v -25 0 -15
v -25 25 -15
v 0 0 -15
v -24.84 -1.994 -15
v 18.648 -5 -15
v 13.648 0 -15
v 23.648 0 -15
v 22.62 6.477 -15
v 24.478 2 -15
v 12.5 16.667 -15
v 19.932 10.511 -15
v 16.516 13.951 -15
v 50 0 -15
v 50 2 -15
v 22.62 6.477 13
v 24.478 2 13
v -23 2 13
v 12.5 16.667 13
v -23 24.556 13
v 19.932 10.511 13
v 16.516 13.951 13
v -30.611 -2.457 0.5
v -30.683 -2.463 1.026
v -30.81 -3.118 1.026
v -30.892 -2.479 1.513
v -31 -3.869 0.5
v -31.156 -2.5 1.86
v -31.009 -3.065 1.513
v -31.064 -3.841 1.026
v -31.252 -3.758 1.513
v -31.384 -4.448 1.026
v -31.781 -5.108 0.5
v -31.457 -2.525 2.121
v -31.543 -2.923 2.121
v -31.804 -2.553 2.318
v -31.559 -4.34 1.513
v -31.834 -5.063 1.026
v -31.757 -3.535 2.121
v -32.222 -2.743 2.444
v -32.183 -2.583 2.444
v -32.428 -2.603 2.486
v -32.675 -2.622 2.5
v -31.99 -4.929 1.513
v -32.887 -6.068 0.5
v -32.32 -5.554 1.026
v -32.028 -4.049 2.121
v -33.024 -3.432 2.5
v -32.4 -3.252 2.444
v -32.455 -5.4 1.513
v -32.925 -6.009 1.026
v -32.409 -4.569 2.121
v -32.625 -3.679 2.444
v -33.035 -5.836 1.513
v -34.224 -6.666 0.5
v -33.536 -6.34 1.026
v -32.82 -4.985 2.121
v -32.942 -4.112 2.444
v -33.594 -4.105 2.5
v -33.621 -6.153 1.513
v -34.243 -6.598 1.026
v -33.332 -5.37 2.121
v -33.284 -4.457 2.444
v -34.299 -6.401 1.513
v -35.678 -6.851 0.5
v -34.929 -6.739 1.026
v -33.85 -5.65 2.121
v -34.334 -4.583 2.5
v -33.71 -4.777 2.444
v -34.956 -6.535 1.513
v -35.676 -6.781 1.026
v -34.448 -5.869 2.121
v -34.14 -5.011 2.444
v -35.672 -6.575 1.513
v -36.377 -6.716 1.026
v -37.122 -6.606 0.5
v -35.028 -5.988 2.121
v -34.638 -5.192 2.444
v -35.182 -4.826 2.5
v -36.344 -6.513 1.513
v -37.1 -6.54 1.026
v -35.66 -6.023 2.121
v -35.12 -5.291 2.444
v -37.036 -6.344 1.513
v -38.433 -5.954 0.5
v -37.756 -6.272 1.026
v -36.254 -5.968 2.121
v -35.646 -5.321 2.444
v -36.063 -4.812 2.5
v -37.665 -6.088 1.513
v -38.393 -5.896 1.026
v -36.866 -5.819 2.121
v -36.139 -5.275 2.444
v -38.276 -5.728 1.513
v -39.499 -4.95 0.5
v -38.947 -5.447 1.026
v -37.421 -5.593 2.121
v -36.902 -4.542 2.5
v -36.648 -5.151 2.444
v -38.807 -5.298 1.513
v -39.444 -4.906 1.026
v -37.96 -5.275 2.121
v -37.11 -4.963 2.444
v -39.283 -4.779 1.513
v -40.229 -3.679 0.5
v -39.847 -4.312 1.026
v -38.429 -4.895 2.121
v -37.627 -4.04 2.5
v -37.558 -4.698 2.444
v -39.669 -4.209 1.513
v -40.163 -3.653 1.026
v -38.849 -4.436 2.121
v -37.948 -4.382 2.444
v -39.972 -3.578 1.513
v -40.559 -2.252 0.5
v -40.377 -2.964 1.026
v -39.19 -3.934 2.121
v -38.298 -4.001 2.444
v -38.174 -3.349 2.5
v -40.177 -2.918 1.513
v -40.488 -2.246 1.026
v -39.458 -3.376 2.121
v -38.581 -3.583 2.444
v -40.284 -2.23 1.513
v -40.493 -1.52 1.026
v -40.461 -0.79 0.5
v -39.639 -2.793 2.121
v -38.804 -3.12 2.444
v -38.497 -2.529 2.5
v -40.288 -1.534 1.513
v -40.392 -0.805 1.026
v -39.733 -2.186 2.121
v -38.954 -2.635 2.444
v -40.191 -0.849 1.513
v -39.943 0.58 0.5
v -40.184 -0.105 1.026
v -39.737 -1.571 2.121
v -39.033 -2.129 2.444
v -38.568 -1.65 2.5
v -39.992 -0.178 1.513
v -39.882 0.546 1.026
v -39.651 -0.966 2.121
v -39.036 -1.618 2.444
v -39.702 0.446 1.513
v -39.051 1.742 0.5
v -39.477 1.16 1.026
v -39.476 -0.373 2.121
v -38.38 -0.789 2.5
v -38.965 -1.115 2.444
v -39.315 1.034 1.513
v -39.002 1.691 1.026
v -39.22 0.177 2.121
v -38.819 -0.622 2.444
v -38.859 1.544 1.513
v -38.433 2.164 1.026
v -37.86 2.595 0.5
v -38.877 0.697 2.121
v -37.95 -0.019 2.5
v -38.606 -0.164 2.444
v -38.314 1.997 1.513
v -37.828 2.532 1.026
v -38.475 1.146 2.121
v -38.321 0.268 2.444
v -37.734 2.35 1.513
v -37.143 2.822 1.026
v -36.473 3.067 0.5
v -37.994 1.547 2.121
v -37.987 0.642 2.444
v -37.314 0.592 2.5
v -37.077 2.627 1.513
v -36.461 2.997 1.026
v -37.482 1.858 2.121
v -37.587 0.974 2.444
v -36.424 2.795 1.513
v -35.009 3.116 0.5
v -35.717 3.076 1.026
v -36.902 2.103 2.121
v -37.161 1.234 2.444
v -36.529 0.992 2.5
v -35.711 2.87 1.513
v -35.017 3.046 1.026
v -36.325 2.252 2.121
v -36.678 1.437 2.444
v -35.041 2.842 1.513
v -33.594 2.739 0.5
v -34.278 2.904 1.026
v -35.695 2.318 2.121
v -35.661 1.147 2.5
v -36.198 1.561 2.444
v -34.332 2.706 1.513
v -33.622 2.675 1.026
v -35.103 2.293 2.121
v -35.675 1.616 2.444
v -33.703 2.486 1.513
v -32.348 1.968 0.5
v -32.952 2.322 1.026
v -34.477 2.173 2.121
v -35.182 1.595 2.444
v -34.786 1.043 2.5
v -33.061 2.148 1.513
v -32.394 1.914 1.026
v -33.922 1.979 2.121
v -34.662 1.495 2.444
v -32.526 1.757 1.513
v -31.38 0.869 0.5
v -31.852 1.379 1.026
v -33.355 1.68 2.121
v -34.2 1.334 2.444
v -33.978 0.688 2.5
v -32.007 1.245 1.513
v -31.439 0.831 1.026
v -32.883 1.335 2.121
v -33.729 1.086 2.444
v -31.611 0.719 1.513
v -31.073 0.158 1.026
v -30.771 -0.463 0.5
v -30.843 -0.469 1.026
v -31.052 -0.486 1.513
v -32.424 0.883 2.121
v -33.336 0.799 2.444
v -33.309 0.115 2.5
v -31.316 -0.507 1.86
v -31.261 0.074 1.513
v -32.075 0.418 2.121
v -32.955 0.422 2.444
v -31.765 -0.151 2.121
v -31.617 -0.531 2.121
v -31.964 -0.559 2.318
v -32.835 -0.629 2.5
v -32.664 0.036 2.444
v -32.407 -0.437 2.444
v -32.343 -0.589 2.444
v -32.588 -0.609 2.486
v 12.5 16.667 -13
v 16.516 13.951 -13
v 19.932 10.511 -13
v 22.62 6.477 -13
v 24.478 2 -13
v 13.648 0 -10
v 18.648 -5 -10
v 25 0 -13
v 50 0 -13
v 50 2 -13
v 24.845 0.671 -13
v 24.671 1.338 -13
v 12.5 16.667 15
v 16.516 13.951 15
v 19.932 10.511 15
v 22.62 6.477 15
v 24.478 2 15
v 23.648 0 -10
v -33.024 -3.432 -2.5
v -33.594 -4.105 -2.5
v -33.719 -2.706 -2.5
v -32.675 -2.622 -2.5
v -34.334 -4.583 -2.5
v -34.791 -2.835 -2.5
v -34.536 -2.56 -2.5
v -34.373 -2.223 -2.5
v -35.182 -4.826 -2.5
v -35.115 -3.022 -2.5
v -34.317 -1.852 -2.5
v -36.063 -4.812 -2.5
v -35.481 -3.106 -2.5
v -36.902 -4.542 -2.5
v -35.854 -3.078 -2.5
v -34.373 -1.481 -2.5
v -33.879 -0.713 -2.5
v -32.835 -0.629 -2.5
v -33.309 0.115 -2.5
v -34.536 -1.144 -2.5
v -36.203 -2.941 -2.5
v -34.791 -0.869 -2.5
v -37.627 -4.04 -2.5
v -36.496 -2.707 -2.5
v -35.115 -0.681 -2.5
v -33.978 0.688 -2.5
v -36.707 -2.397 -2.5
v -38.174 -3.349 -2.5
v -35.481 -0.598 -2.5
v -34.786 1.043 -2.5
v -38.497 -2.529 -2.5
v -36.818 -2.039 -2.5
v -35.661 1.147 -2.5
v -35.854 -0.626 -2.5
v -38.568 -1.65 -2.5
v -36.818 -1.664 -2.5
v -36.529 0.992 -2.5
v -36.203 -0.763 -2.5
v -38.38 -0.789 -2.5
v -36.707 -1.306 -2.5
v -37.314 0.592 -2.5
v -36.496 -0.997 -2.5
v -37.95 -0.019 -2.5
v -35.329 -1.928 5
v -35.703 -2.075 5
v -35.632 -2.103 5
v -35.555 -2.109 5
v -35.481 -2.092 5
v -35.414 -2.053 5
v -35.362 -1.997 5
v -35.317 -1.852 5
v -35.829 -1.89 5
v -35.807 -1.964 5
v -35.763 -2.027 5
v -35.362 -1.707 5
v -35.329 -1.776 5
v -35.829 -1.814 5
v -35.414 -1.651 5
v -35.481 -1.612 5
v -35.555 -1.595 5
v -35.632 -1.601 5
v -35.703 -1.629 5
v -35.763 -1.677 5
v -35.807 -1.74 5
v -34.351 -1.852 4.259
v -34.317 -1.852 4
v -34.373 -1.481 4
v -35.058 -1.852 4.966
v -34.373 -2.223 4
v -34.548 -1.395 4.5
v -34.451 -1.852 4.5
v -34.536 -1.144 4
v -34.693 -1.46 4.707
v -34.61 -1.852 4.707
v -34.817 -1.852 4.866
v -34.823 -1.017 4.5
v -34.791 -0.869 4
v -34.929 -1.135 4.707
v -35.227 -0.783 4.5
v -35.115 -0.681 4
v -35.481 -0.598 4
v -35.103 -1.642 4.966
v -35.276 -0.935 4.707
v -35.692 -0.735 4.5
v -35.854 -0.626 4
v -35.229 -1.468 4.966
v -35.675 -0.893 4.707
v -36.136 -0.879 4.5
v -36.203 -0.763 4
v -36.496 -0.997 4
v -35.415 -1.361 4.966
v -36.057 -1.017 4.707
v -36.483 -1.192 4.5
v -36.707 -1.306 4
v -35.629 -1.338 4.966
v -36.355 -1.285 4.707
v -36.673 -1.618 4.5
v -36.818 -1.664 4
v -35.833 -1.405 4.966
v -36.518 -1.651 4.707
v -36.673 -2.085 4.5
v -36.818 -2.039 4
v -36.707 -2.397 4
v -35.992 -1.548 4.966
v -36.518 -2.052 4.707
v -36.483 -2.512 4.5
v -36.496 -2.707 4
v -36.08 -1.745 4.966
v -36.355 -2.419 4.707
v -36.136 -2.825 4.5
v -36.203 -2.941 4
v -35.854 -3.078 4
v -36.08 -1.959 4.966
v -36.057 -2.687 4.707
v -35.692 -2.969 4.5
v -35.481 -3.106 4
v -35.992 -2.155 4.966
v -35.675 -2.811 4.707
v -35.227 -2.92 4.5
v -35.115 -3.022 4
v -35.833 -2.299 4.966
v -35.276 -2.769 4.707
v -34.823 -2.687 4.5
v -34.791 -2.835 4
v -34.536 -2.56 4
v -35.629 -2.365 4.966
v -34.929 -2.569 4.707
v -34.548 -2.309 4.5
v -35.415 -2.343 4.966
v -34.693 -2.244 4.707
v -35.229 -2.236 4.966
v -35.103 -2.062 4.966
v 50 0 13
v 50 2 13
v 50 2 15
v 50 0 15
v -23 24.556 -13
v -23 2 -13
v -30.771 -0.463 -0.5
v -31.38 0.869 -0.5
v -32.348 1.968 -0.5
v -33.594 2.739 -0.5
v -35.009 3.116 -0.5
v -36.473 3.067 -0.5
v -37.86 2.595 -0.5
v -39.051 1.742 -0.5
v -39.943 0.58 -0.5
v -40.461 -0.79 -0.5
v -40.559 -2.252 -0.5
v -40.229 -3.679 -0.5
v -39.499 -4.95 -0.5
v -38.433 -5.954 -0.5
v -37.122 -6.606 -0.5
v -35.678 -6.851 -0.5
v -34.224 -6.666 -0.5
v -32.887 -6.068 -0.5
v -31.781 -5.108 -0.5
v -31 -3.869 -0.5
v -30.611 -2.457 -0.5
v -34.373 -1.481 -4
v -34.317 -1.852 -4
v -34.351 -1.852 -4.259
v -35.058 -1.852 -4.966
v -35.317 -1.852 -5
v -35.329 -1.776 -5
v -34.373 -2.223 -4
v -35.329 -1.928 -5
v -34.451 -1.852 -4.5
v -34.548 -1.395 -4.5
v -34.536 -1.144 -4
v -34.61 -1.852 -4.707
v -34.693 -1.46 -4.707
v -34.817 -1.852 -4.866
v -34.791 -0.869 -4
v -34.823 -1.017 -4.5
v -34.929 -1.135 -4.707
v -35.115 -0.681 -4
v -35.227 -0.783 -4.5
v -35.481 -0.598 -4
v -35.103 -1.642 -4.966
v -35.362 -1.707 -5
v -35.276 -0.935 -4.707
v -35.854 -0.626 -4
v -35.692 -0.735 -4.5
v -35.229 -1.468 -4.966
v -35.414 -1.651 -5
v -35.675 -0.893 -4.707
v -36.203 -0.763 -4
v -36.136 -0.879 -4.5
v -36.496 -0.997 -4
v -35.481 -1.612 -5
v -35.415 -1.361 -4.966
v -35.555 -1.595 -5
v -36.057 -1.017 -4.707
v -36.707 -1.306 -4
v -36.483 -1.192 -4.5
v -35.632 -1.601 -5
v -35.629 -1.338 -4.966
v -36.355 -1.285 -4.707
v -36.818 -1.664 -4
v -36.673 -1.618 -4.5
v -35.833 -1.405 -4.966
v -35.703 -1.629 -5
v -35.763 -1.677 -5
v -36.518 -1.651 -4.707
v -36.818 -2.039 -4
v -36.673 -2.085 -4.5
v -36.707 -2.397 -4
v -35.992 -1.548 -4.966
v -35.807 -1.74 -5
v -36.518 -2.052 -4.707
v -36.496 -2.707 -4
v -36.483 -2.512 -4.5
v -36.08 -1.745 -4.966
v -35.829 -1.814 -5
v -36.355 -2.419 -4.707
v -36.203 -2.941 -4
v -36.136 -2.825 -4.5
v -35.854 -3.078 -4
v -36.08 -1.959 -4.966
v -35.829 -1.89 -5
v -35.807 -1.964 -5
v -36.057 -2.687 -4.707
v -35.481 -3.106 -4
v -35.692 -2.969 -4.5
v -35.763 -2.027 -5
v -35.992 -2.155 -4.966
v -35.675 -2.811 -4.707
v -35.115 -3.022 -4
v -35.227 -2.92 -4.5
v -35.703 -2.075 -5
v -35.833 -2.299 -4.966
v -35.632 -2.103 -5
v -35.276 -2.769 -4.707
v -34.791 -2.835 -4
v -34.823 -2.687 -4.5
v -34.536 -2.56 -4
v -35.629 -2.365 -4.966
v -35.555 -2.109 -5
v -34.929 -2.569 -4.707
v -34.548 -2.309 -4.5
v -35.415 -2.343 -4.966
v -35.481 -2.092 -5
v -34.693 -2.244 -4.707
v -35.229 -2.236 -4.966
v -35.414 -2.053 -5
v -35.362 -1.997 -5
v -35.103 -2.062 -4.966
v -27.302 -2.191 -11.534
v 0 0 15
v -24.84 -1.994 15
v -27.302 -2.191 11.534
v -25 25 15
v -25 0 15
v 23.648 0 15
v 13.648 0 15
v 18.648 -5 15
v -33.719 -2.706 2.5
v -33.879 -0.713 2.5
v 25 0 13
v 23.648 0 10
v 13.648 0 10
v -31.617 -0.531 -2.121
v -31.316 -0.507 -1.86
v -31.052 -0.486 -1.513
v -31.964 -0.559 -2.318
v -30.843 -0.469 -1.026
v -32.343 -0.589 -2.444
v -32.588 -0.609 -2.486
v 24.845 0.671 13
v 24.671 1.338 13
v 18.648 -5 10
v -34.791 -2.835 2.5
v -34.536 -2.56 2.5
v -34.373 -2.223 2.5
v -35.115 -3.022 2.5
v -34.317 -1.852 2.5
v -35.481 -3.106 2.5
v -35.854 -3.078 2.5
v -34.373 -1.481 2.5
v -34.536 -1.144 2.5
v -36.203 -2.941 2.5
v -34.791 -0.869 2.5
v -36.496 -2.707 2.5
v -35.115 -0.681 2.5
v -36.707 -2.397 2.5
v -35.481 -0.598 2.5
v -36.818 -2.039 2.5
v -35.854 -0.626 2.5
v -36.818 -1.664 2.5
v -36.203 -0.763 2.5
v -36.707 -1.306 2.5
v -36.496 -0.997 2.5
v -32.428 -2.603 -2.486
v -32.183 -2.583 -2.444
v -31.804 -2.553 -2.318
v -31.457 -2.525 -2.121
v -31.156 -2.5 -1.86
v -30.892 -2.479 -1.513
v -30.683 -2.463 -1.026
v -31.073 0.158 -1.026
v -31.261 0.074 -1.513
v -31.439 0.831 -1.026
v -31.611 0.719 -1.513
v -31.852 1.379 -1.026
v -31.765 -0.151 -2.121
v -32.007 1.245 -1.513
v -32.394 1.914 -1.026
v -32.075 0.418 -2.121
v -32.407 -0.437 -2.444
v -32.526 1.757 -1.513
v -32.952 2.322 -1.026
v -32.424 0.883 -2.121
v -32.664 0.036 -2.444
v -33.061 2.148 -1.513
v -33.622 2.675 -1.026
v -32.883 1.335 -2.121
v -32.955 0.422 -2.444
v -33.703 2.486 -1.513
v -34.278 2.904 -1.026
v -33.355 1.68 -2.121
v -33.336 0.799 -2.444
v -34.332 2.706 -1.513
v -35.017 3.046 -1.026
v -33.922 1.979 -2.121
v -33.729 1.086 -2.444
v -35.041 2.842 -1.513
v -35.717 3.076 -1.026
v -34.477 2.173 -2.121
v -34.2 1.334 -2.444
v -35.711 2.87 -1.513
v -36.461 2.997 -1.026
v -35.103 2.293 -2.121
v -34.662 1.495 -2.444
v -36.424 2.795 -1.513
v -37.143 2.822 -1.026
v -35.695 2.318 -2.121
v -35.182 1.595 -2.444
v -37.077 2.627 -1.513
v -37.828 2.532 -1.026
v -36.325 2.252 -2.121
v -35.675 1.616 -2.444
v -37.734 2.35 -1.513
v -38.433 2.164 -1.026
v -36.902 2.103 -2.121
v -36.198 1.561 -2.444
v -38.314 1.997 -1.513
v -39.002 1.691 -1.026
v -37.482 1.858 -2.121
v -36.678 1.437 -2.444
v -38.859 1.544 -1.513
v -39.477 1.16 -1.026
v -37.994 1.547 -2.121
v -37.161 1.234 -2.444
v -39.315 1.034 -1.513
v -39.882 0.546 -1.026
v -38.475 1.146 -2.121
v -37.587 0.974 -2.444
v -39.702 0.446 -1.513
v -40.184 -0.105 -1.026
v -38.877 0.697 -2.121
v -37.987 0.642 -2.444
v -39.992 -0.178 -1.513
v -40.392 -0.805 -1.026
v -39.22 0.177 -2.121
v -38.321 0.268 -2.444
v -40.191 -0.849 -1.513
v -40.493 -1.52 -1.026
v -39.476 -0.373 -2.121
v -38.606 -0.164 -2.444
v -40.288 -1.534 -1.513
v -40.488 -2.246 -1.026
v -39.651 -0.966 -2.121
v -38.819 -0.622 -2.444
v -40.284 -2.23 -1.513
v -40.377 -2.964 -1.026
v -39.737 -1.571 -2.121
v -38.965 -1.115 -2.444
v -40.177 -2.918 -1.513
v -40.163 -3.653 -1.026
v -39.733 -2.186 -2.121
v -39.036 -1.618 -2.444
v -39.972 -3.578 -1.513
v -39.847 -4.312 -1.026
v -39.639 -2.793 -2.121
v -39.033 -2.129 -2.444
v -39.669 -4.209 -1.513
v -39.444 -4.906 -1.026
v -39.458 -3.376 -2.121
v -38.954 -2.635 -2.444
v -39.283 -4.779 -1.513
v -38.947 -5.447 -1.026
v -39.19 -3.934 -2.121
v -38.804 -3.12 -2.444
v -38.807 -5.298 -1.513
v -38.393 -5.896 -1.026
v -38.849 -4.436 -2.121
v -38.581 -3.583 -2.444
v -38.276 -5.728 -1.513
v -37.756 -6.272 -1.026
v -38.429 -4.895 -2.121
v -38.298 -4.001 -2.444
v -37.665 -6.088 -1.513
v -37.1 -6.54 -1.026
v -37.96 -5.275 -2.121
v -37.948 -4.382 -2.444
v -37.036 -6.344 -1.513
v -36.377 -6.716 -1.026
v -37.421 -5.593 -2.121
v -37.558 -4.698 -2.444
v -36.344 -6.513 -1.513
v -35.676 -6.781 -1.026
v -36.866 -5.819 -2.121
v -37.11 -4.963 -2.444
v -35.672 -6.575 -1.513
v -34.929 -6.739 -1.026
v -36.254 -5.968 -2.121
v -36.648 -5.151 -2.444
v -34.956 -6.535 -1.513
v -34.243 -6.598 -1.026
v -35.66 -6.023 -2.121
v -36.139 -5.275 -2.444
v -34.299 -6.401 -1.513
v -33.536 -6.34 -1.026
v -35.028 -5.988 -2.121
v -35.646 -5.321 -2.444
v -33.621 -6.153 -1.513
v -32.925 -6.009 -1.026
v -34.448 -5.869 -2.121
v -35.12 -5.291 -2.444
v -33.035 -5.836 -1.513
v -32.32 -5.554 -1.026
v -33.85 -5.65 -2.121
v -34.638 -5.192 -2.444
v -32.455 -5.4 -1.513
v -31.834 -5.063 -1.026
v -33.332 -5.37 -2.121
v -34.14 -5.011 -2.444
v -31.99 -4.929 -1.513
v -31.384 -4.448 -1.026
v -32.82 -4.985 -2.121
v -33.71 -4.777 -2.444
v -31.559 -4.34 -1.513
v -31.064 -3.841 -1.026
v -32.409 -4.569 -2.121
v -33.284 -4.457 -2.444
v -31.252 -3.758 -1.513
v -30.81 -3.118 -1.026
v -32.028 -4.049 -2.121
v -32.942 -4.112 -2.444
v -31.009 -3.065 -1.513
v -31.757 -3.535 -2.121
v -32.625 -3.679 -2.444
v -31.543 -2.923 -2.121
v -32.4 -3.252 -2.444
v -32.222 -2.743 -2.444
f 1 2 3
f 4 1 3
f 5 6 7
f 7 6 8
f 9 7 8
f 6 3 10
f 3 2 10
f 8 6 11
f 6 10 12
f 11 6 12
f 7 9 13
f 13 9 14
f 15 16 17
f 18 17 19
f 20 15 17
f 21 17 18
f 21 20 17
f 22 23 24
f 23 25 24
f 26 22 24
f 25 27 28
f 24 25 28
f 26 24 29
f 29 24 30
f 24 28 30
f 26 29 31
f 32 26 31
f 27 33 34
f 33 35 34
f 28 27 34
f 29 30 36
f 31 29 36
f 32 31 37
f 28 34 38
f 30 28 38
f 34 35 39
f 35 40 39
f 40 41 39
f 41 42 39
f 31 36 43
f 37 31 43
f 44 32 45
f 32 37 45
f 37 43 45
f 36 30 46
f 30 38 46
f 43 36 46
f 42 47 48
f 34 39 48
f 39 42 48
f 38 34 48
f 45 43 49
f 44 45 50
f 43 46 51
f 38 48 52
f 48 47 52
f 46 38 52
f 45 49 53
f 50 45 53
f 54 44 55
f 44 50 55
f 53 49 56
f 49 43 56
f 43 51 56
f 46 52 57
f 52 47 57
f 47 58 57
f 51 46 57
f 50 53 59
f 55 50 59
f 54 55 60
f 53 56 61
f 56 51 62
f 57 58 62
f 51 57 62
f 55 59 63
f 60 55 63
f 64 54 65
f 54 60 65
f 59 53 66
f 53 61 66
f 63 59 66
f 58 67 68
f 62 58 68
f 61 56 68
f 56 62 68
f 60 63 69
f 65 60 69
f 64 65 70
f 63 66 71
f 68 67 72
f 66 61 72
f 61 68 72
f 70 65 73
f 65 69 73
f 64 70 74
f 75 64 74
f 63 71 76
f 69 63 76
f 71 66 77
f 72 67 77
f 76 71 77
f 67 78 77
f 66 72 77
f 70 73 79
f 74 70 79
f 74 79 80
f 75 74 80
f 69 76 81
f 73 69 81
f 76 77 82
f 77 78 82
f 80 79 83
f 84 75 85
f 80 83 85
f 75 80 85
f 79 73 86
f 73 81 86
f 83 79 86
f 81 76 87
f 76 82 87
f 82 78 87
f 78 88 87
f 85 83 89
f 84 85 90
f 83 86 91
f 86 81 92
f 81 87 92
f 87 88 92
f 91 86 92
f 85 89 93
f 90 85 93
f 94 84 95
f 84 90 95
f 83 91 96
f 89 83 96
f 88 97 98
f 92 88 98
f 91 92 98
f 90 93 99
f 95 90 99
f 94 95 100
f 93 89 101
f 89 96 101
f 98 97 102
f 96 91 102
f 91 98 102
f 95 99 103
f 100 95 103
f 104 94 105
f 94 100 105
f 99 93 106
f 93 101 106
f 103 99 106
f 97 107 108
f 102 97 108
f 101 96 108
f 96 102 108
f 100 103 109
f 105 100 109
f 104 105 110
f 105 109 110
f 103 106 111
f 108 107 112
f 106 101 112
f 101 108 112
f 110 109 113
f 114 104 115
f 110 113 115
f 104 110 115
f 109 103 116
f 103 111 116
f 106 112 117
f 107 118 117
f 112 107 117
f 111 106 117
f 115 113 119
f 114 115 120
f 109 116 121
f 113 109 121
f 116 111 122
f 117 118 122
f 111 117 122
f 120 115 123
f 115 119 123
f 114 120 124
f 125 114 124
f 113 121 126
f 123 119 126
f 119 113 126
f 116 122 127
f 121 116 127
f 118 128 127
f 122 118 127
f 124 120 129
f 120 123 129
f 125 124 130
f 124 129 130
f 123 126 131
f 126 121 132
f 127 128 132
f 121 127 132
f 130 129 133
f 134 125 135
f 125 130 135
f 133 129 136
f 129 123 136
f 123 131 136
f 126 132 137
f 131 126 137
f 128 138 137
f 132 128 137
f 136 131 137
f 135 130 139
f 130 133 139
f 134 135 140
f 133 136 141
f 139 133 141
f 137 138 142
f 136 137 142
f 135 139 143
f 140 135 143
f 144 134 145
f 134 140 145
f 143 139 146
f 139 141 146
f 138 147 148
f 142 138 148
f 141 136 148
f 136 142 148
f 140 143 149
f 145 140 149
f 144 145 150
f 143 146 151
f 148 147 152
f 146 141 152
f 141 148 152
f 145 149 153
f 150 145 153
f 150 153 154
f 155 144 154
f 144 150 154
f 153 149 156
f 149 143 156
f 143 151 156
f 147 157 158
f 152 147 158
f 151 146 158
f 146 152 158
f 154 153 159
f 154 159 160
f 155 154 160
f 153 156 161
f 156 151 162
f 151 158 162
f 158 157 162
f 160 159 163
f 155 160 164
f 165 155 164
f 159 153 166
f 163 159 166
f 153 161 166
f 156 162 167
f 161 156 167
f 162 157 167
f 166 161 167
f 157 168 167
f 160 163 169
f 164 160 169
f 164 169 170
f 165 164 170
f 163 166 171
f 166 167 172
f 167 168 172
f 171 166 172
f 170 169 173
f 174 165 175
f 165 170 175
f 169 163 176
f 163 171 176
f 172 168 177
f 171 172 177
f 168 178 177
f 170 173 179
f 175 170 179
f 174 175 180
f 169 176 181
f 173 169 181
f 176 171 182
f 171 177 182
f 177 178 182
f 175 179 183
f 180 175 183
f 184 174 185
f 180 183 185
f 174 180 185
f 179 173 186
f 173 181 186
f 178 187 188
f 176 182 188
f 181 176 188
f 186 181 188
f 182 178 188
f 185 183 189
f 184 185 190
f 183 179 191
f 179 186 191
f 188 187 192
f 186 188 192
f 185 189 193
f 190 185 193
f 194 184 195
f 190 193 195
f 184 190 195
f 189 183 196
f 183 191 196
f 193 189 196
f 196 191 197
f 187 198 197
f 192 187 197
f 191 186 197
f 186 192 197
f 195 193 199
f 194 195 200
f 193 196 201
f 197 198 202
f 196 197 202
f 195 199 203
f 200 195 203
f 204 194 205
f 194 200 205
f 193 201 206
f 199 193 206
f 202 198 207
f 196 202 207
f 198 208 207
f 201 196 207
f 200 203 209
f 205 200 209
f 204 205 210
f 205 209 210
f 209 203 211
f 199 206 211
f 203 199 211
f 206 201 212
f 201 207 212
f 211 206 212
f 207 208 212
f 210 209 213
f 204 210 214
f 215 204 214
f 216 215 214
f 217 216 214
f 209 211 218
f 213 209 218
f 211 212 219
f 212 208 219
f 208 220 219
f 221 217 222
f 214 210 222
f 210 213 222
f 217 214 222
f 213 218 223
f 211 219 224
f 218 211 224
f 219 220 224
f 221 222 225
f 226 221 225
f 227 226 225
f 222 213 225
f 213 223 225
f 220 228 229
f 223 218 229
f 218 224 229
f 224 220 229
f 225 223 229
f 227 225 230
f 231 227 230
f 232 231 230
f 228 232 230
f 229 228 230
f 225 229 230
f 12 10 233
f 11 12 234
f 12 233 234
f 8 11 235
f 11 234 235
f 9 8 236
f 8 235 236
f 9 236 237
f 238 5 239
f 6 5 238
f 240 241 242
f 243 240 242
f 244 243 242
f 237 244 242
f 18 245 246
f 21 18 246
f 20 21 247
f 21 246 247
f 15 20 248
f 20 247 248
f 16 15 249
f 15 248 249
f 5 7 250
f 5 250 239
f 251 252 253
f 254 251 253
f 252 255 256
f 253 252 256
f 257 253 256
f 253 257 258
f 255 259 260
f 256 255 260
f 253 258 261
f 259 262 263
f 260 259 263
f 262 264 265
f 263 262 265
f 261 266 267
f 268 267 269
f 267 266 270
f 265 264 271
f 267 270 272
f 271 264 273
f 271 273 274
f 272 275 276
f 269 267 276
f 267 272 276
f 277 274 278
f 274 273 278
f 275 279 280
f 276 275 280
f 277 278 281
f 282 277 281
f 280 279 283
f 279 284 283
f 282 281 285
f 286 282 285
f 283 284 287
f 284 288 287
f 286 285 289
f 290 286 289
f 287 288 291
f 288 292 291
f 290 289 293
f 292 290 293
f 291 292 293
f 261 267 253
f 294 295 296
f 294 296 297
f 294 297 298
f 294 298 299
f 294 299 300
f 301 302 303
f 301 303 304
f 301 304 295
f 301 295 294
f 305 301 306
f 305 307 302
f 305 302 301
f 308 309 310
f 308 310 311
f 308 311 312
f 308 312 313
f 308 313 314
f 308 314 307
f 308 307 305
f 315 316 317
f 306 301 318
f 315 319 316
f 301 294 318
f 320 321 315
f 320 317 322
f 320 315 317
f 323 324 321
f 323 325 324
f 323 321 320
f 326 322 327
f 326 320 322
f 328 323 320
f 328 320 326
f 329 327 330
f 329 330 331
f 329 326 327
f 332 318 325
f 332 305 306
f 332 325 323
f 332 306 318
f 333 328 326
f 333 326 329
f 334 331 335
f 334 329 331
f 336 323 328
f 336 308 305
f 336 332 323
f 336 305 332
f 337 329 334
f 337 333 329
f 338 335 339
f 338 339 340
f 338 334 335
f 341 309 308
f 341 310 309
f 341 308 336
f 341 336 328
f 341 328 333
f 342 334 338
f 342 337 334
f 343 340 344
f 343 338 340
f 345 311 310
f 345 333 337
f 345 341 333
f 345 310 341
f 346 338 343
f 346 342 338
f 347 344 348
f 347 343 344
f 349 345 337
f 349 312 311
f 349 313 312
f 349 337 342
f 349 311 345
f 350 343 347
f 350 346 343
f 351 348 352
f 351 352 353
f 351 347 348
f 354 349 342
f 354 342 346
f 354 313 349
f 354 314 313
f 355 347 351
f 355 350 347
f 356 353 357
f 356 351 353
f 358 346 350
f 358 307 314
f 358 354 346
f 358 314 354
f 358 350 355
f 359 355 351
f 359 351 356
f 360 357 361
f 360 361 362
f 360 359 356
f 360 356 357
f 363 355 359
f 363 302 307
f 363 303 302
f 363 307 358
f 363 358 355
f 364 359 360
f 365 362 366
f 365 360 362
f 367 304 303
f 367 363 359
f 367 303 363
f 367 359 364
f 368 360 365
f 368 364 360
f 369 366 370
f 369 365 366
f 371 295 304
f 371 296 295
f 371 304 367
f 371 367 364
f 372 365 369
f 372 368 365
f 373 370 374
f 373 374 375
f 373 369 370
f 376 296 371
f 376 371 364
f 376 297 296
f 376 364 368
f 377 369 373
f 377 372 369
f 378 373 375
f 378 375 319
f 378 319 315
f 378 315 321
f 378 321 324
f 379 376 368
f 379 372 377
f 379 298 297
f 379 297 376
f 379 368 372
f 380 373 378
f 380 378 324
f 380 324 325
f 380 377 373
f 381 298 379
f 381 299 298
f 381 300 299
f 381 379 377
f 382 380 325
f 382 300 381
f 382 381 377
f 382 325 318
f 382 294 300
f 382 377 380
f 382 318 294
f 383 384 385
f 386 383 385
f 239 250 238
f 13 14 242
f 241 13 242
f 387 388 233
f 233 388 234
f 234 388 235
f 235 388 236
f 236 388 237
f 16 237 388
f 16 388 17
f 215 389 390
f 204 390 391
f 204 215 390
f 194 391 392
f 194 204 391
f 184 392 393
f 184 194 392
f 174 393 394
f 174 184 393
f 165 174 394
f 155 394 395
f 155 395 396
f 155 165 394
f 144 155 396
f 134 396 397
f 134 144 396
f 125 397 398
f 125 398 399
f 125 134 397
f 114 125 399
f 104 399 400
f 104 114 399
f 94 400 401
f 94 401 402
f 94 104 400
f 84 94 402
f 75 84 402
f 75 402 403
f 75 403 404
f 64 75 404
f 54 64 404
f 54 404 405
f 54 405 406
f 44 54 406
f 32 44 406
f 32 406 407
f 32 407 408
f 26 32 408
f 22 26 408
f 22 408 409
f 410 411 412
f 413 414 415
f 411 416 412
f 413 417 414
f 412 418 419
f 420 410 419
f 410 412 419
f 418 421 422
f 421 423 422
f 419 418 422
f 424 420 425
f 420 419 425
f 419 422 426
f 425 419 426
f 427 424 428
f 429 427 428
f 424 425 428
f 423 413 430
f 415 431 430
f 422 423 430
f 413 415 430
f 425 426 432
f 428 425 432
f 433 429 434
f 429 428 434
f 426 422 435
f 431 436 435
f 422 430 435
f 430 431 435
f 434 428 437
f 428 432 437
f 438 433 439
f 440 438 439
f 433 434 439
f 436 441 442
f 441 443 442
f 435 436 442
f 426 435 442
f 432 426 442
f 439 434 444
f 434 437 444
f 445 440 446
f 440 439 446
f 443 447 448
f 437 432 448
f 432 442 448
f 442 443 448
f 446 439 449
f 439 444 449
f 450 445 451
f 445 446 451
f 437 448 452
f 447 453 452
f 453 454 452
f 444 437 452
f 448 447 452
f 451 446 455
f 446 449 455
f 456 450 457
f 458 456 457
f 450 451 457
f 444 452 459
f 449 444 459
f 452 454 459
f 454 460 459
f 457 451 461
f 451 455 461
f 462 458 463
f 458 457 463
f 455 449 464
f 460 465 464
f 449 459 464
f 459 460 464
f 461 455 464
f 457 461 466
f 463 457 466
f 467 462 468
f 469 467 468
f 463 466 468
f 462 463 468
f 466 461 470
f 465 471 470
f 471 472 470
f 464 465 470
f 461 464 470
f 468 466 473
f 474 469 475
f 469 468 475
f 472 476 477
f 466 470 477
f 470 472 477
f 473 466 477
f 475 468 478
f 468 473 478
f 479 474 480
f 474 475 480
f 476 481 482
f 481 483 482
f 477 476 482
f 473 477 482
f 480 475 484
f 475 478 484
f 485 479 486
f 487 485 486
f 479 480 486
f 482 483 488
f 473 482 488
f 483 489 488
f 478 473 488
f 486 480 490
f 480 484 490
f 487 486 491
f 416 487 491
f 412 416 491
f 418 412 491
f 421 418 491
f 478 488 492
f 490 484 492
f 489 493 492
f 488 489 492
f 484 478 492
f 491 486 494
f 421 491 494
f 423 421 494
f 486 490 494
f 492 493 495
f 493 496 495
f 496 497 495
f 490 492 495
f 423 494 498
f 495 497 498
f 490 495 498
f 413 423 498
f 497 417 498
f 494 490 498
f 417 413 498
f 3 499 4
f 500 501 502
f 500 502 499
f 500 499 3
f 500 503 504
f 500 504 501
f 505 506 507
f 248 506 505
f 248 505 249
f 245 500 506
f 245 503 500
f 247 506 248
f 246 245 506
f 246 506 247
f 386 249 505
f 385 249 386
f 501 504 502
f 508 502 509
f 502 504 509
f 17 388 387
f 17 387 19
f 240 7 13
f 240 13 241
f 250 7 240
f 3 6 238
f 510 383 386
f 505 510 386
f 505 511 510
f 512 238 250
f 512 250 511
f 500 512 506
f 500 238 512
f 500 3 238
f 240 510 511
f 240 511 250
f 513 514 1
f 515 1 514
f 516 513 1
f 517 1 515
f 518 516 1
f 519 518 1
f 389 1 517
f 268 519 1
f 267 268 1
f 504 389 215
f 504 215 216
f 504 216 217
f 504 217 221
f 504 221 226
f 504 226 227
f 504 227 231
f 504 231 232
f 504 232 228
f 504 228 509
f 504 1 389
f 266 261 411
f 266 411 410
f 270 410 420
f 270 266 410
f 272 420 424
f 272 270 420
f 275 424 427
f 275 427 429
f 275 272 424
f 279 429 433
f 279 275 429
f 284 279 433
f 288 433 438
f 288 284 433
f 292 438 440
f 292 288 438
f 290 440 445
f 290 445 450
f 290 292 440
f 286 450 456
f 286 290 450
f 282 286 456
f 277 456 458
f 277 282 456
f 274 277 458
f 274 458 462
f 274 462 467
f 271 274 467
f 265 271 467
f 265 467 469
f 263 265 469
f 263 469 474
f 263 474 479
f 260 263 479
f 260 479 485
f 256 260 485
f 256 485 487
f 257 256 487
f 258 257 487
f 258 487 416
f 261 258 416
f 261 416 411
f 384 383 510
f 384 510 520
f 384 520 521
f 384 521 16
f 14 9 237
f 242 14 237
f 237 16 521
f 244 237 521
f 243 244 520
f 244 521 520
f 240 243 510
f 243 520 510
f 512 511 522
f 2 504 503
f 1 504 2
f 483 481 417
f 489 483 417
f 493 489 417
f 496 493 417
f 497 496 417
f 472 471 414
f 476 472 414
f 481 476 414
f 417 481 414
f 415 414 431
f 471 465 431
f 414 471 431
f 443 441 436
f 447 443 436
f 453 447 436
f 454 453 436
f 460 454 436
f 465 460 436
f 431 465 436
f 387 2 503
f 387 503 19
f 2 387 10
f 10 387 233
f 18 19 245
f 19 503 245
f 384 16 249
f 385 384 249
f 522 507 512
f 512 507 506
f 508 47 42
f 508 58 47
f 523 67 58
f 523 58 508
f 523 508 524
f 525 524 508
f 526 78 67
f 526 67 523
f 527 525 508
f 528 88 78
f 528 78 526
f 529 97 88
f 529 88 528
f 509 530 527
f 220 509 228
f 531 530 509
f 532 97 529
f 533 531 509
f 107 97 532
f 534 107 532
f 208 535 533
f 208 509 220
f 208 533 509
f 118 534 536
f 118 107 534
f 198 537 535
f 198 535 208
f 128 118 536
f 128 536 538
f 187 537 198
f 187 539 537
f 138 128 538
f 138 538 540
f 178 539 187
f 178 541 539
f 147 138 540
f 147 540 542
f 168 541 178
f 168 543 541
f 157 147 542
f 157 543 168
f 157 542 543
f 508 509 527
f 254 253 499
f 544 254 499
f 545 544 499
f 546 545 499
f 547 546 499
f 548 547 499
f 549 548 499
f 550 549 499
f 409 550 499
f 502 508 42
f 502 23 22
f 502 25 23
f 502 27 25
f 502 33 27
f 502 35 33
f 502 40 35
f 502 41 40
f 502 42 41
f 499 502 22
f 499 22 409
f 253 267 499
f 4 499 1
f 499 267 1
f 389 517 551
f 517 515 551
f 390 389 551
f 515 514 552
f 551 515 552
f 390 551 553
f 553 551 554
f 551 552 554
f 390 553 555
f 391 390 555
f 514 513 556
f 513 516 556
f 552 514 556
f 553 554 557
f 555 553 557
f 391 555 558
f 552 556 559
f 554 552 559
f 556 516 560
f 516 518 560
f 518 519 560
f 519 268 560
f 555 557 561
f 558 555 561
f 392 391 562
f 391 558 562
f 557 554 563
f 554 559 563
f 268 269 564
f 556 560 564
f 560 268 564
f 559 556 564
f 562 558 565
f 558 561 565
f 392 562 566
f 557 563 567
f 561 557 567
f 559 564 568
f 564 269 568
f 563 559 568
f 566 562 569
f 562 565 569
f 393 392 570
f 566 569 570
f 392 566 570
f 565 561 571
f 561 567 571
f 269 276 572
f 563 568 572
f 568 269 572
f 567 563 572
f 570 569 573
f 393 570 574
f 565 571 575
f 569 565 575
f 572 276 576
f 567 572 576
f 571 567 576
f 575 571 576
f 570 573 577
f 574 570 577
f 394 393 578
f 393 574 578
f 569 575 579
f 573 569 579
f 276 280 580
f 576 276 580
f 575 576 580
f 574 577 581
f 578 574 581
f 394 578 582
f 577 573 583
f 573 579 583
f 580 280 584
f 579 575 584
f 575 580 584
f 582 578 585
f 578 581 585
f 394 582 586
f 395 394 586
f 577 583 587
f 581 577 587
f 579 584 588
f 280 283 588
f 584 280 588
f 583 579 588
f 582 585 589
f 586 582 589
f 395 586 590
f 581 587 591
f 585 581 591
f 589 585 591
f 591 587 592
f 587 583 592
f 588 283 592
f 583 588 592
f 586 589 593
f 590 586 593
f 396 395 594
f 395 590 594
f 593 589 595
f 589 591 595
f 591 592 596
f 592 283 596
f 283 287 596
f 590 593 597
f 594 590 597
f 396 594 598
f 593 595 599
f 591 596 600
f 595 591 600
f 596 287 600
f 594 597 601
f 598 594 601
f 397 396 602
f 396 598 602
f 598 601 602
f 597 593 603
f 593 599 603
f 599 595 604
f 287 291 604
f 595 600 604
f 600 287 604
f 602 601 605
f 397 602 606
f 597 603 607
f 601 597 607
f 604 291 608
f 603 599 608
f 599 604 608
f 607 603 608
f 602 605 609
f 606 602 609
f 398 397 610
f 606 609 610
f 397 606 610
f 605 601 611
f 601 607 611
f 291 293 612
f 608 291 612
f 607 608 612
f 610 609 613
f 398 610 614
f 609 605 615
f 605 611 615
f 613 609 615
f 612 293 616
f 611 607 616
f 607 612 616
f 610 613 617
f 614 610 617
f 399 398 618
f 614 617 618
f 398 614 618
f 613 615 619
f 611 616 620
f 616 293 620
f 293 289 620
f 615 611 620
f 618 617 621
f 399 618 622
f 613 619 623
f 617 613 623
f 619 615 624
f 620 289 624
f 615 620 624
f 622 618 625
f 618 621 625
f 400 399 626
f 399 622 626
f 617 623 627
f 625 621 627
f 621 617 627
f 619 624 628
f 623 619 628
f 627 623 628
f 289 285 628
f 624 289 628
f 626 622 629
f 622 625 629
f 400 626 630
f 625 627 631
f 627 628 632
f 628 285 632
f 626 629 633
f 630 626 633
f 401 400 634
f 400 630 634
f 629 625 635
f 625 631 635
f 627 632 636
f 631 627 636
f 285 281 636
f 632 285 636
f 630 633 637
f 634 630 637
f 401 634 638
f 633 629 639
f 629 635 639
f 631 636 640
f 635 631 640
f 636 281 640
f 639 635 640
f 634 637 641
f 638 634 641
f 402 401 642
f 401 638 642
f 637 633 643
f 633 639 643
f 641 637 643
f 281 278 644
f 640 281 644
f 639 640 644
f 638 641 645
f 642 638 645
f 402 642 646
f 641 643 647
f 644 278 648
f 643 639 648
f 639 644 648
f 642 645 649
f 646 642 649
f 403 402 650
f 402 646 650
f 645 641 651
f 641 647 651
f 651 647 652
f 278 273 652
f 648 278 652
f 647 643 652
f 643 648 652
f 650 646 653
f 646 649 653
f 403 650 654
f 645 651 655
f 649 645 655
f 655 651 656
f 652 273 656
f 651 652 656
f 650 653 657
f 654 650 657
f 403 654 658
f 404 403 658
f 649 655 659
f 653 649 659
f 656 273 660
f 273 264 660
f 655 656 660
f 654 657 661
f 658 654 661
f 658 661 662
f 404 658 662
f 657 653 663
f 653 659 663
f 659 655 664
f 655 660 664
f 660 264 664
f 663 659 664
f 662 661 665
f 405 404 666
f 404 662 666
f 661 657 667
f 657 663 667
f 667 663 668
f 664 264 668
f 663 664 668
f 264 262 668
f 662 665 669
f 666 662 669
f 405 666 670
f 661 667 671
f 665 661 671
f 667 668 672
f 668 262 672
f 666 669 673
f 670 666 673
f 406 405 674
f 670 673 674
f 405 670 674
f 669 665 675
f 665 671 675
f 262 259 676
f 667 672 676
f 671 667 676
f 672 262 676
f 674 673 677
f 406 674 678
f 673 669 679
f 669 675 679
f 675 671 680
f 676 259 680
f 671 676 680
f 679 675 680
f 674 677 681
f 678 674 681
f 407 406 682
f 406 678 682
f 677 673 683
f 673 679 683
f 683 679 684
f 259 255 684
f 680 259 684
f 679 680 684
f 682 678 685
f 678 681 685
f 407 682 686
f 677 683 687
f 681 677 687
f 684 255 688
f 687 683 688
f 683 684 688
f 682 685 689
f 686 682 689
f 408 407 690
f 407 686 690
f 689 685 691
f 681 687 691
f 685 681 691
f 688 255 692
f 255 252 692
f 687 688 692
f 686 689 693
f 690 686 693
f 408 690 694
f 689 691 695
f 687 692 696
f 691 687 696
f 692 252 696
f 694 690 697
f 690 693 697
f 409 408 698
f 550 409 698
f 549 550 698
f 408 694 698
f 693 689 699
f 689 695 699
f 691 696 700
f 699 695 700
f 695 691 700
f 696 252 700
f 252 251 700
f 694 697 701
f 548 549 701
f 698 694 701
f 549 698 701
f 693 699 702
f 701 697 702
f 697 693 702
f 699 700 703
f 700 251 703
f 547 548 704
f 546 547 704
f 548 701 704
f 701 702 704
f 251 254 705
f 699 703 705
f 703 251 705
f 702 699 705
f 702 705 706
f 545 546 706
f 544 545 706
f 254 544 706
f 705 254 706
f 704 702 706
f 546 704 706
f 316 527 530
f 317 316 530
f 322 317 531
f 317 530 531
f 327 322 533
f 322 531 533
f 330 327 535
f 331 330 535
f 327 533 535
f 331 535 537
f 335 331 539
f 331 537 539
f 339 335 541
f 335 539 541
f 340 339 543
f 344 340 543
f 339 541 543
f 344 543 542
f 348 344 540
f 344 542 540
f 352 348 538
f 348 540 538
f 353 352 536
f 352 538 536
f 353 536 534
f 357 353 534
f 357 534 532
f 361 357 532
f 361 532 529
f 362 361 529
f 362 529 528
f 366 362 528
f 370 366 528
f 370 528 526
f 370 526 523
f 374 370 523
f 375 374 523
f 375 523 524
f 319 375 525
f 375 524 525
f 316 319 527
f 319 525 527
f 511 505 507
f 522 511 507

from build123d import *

# Parameters (mm, degrees)
SKETCH2_W                  = 50
SKETCH2_H                  = 30
BOSS_EXTRUDE1_DEPTH        = 25
CUT_EXTRUDE2_DEPTH         = 31
SKETCH7_W                  = 26
SKETCH7_H                  = 21
CUT_EXTRUDE3_DEPTH         = 48
SKETCH8_W                  = 7.000000004
SKETCH8_H                  = 26
CUT_EXTRUDE6_DEPTH         = 3
CUT_EXTRUDE6_DEPTH_BACK    = 10
SKETCH9_W                  = 2
SKETCH9_H                  = 2
BOSS_EXTRUDE2_DEPTH        = 25
BOSS_EXTRUDE2_DEPTH_BACK   = 25
BOSS_EXTRUDE2_2_DEPTH      = 25
BOSS_EXTRUDE2_2_DEPTH_BACK = 25
BOSS_EXTRUDE3_DEPTH        = 30
CUT_EXTRUDE7_DEPTH         = 30
SKETCH13_R                 = 5
BOSS_EXTRUDE4_DEPTH        = 2.5
BOSS_EXTRUDE4_DEPTH_BACK   = 2.5
SKETCH14_R                 = 1.257458731
BOSS_EXTRUDE5_DEPTH        = 2.5
BOSS_EXTRUDE5_DEPTH_BACK   = 7.5
FILLET3_R                  = 2
FILLET4_R                  = 2
FILLET7_R                  = 1
FILLET8_R                  = 1
BOSS_EXTRUDE6_DEPTH        = 5
BOSS_EXTRUDE7_DEPTH        = 5


with BuildPart() as part:
    # Sketch2 → Boss-Extrude1 (new body)
    with BuildSketch(Plane(origin=(0, 0, 0), x_dir=(1, 0, 0), z_dir=(0, 1, 0))):
        Rectangle(SKETCH2_W, SKETCH2_H)
    extrude(amount=BOSS_EXTRUDE1_DEPTH)

    # Sketch3 → Cut-Extrude2 (cut, through all)
    with BuildSketch(Plane.XY.offset(15)):
        with BuildLine():
            Line((-25, 25), (12.5, 16.66666667))
            ThreePointArc((12.5, 16.66666667), (20.568813143, 9.697443192), (25, 0))
            Line((25, 0), (25, 25))
            Line((25, 25), (-25, 25))
        make_face()
    extrude(amount=-CUT_EXTRUDE2_DEPTH, mode=Mode.SUBTRACT)

    # Sketch7 → Cut-Extrude3 (cut)
    with BuildSketch(Plane.ZY.offset(-25)):
        with Locations((0, 12.5)):
            Rectangle(SKETCH7_W, SKETCH7_H)
    extrude(amount=CUT_EXTRUDE3_DEPTH, mode=Mode.SUBTRACT)

    # Sketch8 → Cut-Extrude6 (cut, two sides)
    with BuildSketch(Plane.XZ.offset(-23)) as cut_extrude6_sk:
        with Locations((-19.499999998, 0)):
            Rectangle(SKETCH8_W, SKETCH8_H)
    extrude(amount=CUT_EXTRUDE6_DEPTH, mode=Mode.SUBTRACT)
    extrude(cut_extrude6_sk.sketch, amount=-CUT_EXTRUDE6_DEPTH_BACK, mode=Mode.SUBTRACT)



with BuildPart() as body_2:
    # Sketch9 → Boss-Extrude2 (new body, two sides)
    with BuildSketch(Plane.ZY.offset(-25)) as boss_extrude2_sk:
        with Locations((14, 1)):
            Rectangle(SKETCH9_W, SKETCH9_H)
    extrude(amount=BOSS_EXTRUDE2_DEPTH)
    extrude(boss_extrude2_sk.sketch, amount=-BOSS_EXTRUDE2_DEPTH_BACK)


with BuildPart() as body_3:
    # Sketch9 → Boss-Extrude2 2 (new body, two sides)
    with BuildSketch(Plane.ZY.offset(-25)) as boss_extrude2_2_sk:
        with Locations((-14, 1)):
            Rectangle(SKETCH9_W, SKETCH9_H)
    extrude(amount=BOSS_EXTRUDE2_2_DEPTH)
    extrude(boss_extrude2_2_sk.sketch, amount=-BOSS_EXTRUDE2_2_DEPTH_BACK)


with BuildPart() as part_1:
    add(part.part)

    add(body_2.part)  # Boss-Extrude3 merges body 2

    add(body_3.part)  # Boss-Extrude3 merges body 3
    # Sketch10 → Boss-Extrude3 (add)
    with BuildSketch(Plane.XY.offset(15)):
        Polygon((-25, 0), (-35.654566136, -0.855106022), (-35.494566136, -2.848695749), (-27.301895797, -2.191174678), (0, 0), align=None)
    extrude(amount=-BOSS_EXTRUDE3_DEPTH)

    # Sketch11 → Cut-Extrude7 (cut)
    with BuildSketch(Plane(origin=(-0.16, 1.993589727, 0), x_dir=(0.996794864, 0.08, 0), z_dir=(-0.08, 0.996794864, 0))):
        Polygon((-24.919871589, -15), (-35.608696868, 0), (-35.608696868, -15), align=None)
        Polygon((-35.608696868, 0), (-24.919871589, 15), (-35.608696868, 15), align=None)
    extrude(amount=-CUT_EXTRUDE7_DEPTH, mode=Mode.SUBTRACT)

    # Sketch13 → Boss-Extrude4 (add, two sides)
    with BuildSketch(Plane(origin=(0, 0, 0), x_dir=(-0.08, 0.996794864, 0), z_dir=(0, 0, 1))) as boss_extrude4_sk:
        with Locations((1, 35.608696868)):
            Circle(SKETCH13_R)
    extrude(amount=BOSS_EXTRUDE4_DEPTH)
    extrude(boss_extrude4_sk.sketch, amount=-BOSS_EXTRUDE4_DEPTH_BACK)

    # Sketch14 → Boss-Extrude5 (add, two sides)
    with BuildSketch(Plane.XY.offset(2.5)) as boss_extrude5_sk:
        with Locations((-35.574566136, -1.851900886)):
            Circle(SKETCH14_R)
    extrude(amount=BOSS_EXTRUDE5_DEPTH)
    extrude(boss_extrude5_sk.sketch, amount=-BOSS_EXTRUDE5_DEPTH_BACK)

    # Fillet3
    fillet3_edges = [part_1.edges().sort_by_distance(p)[0] for p in [
        (-40.558540453, -2.251900886, 2.5),
    ]]
    fillet(fillet3_edges, radius=FILLET3_R)

    # Fillet4
    fillet4_edges = [part_1.edges().sort_by_distance(p)[0] for p in [
        (-40.558540453, -2.251900886, -2.5),
    ]]
    fillet(fillet4_edges, radius=FILLET4_R)

    # Fillet7
    fillet7_edges = [part_1.edges().sort_by_distance(p)[0] for p in [
        (-36.832024866, -1.851900886, 5),
    ]]
    fillet(fillet7_edges, radius=FILLET7_R)

    # Fillet8
    fillet8_edges = [part_1.edges().sort_by_distance(p)[0] for p in [
        (-36.832024866, -1.851900886, -5),
    ]]
    fillet(fillet8_edges, radius=FILLET8_R)

    # Sketch15 → Boss-Extrude6 (add)
    with BuildSketch(Plane.XY.offset(15)):
        Polygon((23.647734322, 0), (18.647734702, -5), (13.647734322, 0), align=None)
    extrude(amount=-BOSS_EXTRUDE6_DEPTH)

    # Sketch16 → Boss-Extrude7 (add)
    with BuildSketch(Plane(origin=(0, 0, -15), x_dir=(-1, 0, 0), z_dir=(0, 0, -1))):
        Polygon((-23.647734322, 0), (-18.647734702, -5), (-13.647734322, 0), align=None)
    extrude(amount=-BOSS_EXTRUDE7_DEPTH)


solid = part_1.part
